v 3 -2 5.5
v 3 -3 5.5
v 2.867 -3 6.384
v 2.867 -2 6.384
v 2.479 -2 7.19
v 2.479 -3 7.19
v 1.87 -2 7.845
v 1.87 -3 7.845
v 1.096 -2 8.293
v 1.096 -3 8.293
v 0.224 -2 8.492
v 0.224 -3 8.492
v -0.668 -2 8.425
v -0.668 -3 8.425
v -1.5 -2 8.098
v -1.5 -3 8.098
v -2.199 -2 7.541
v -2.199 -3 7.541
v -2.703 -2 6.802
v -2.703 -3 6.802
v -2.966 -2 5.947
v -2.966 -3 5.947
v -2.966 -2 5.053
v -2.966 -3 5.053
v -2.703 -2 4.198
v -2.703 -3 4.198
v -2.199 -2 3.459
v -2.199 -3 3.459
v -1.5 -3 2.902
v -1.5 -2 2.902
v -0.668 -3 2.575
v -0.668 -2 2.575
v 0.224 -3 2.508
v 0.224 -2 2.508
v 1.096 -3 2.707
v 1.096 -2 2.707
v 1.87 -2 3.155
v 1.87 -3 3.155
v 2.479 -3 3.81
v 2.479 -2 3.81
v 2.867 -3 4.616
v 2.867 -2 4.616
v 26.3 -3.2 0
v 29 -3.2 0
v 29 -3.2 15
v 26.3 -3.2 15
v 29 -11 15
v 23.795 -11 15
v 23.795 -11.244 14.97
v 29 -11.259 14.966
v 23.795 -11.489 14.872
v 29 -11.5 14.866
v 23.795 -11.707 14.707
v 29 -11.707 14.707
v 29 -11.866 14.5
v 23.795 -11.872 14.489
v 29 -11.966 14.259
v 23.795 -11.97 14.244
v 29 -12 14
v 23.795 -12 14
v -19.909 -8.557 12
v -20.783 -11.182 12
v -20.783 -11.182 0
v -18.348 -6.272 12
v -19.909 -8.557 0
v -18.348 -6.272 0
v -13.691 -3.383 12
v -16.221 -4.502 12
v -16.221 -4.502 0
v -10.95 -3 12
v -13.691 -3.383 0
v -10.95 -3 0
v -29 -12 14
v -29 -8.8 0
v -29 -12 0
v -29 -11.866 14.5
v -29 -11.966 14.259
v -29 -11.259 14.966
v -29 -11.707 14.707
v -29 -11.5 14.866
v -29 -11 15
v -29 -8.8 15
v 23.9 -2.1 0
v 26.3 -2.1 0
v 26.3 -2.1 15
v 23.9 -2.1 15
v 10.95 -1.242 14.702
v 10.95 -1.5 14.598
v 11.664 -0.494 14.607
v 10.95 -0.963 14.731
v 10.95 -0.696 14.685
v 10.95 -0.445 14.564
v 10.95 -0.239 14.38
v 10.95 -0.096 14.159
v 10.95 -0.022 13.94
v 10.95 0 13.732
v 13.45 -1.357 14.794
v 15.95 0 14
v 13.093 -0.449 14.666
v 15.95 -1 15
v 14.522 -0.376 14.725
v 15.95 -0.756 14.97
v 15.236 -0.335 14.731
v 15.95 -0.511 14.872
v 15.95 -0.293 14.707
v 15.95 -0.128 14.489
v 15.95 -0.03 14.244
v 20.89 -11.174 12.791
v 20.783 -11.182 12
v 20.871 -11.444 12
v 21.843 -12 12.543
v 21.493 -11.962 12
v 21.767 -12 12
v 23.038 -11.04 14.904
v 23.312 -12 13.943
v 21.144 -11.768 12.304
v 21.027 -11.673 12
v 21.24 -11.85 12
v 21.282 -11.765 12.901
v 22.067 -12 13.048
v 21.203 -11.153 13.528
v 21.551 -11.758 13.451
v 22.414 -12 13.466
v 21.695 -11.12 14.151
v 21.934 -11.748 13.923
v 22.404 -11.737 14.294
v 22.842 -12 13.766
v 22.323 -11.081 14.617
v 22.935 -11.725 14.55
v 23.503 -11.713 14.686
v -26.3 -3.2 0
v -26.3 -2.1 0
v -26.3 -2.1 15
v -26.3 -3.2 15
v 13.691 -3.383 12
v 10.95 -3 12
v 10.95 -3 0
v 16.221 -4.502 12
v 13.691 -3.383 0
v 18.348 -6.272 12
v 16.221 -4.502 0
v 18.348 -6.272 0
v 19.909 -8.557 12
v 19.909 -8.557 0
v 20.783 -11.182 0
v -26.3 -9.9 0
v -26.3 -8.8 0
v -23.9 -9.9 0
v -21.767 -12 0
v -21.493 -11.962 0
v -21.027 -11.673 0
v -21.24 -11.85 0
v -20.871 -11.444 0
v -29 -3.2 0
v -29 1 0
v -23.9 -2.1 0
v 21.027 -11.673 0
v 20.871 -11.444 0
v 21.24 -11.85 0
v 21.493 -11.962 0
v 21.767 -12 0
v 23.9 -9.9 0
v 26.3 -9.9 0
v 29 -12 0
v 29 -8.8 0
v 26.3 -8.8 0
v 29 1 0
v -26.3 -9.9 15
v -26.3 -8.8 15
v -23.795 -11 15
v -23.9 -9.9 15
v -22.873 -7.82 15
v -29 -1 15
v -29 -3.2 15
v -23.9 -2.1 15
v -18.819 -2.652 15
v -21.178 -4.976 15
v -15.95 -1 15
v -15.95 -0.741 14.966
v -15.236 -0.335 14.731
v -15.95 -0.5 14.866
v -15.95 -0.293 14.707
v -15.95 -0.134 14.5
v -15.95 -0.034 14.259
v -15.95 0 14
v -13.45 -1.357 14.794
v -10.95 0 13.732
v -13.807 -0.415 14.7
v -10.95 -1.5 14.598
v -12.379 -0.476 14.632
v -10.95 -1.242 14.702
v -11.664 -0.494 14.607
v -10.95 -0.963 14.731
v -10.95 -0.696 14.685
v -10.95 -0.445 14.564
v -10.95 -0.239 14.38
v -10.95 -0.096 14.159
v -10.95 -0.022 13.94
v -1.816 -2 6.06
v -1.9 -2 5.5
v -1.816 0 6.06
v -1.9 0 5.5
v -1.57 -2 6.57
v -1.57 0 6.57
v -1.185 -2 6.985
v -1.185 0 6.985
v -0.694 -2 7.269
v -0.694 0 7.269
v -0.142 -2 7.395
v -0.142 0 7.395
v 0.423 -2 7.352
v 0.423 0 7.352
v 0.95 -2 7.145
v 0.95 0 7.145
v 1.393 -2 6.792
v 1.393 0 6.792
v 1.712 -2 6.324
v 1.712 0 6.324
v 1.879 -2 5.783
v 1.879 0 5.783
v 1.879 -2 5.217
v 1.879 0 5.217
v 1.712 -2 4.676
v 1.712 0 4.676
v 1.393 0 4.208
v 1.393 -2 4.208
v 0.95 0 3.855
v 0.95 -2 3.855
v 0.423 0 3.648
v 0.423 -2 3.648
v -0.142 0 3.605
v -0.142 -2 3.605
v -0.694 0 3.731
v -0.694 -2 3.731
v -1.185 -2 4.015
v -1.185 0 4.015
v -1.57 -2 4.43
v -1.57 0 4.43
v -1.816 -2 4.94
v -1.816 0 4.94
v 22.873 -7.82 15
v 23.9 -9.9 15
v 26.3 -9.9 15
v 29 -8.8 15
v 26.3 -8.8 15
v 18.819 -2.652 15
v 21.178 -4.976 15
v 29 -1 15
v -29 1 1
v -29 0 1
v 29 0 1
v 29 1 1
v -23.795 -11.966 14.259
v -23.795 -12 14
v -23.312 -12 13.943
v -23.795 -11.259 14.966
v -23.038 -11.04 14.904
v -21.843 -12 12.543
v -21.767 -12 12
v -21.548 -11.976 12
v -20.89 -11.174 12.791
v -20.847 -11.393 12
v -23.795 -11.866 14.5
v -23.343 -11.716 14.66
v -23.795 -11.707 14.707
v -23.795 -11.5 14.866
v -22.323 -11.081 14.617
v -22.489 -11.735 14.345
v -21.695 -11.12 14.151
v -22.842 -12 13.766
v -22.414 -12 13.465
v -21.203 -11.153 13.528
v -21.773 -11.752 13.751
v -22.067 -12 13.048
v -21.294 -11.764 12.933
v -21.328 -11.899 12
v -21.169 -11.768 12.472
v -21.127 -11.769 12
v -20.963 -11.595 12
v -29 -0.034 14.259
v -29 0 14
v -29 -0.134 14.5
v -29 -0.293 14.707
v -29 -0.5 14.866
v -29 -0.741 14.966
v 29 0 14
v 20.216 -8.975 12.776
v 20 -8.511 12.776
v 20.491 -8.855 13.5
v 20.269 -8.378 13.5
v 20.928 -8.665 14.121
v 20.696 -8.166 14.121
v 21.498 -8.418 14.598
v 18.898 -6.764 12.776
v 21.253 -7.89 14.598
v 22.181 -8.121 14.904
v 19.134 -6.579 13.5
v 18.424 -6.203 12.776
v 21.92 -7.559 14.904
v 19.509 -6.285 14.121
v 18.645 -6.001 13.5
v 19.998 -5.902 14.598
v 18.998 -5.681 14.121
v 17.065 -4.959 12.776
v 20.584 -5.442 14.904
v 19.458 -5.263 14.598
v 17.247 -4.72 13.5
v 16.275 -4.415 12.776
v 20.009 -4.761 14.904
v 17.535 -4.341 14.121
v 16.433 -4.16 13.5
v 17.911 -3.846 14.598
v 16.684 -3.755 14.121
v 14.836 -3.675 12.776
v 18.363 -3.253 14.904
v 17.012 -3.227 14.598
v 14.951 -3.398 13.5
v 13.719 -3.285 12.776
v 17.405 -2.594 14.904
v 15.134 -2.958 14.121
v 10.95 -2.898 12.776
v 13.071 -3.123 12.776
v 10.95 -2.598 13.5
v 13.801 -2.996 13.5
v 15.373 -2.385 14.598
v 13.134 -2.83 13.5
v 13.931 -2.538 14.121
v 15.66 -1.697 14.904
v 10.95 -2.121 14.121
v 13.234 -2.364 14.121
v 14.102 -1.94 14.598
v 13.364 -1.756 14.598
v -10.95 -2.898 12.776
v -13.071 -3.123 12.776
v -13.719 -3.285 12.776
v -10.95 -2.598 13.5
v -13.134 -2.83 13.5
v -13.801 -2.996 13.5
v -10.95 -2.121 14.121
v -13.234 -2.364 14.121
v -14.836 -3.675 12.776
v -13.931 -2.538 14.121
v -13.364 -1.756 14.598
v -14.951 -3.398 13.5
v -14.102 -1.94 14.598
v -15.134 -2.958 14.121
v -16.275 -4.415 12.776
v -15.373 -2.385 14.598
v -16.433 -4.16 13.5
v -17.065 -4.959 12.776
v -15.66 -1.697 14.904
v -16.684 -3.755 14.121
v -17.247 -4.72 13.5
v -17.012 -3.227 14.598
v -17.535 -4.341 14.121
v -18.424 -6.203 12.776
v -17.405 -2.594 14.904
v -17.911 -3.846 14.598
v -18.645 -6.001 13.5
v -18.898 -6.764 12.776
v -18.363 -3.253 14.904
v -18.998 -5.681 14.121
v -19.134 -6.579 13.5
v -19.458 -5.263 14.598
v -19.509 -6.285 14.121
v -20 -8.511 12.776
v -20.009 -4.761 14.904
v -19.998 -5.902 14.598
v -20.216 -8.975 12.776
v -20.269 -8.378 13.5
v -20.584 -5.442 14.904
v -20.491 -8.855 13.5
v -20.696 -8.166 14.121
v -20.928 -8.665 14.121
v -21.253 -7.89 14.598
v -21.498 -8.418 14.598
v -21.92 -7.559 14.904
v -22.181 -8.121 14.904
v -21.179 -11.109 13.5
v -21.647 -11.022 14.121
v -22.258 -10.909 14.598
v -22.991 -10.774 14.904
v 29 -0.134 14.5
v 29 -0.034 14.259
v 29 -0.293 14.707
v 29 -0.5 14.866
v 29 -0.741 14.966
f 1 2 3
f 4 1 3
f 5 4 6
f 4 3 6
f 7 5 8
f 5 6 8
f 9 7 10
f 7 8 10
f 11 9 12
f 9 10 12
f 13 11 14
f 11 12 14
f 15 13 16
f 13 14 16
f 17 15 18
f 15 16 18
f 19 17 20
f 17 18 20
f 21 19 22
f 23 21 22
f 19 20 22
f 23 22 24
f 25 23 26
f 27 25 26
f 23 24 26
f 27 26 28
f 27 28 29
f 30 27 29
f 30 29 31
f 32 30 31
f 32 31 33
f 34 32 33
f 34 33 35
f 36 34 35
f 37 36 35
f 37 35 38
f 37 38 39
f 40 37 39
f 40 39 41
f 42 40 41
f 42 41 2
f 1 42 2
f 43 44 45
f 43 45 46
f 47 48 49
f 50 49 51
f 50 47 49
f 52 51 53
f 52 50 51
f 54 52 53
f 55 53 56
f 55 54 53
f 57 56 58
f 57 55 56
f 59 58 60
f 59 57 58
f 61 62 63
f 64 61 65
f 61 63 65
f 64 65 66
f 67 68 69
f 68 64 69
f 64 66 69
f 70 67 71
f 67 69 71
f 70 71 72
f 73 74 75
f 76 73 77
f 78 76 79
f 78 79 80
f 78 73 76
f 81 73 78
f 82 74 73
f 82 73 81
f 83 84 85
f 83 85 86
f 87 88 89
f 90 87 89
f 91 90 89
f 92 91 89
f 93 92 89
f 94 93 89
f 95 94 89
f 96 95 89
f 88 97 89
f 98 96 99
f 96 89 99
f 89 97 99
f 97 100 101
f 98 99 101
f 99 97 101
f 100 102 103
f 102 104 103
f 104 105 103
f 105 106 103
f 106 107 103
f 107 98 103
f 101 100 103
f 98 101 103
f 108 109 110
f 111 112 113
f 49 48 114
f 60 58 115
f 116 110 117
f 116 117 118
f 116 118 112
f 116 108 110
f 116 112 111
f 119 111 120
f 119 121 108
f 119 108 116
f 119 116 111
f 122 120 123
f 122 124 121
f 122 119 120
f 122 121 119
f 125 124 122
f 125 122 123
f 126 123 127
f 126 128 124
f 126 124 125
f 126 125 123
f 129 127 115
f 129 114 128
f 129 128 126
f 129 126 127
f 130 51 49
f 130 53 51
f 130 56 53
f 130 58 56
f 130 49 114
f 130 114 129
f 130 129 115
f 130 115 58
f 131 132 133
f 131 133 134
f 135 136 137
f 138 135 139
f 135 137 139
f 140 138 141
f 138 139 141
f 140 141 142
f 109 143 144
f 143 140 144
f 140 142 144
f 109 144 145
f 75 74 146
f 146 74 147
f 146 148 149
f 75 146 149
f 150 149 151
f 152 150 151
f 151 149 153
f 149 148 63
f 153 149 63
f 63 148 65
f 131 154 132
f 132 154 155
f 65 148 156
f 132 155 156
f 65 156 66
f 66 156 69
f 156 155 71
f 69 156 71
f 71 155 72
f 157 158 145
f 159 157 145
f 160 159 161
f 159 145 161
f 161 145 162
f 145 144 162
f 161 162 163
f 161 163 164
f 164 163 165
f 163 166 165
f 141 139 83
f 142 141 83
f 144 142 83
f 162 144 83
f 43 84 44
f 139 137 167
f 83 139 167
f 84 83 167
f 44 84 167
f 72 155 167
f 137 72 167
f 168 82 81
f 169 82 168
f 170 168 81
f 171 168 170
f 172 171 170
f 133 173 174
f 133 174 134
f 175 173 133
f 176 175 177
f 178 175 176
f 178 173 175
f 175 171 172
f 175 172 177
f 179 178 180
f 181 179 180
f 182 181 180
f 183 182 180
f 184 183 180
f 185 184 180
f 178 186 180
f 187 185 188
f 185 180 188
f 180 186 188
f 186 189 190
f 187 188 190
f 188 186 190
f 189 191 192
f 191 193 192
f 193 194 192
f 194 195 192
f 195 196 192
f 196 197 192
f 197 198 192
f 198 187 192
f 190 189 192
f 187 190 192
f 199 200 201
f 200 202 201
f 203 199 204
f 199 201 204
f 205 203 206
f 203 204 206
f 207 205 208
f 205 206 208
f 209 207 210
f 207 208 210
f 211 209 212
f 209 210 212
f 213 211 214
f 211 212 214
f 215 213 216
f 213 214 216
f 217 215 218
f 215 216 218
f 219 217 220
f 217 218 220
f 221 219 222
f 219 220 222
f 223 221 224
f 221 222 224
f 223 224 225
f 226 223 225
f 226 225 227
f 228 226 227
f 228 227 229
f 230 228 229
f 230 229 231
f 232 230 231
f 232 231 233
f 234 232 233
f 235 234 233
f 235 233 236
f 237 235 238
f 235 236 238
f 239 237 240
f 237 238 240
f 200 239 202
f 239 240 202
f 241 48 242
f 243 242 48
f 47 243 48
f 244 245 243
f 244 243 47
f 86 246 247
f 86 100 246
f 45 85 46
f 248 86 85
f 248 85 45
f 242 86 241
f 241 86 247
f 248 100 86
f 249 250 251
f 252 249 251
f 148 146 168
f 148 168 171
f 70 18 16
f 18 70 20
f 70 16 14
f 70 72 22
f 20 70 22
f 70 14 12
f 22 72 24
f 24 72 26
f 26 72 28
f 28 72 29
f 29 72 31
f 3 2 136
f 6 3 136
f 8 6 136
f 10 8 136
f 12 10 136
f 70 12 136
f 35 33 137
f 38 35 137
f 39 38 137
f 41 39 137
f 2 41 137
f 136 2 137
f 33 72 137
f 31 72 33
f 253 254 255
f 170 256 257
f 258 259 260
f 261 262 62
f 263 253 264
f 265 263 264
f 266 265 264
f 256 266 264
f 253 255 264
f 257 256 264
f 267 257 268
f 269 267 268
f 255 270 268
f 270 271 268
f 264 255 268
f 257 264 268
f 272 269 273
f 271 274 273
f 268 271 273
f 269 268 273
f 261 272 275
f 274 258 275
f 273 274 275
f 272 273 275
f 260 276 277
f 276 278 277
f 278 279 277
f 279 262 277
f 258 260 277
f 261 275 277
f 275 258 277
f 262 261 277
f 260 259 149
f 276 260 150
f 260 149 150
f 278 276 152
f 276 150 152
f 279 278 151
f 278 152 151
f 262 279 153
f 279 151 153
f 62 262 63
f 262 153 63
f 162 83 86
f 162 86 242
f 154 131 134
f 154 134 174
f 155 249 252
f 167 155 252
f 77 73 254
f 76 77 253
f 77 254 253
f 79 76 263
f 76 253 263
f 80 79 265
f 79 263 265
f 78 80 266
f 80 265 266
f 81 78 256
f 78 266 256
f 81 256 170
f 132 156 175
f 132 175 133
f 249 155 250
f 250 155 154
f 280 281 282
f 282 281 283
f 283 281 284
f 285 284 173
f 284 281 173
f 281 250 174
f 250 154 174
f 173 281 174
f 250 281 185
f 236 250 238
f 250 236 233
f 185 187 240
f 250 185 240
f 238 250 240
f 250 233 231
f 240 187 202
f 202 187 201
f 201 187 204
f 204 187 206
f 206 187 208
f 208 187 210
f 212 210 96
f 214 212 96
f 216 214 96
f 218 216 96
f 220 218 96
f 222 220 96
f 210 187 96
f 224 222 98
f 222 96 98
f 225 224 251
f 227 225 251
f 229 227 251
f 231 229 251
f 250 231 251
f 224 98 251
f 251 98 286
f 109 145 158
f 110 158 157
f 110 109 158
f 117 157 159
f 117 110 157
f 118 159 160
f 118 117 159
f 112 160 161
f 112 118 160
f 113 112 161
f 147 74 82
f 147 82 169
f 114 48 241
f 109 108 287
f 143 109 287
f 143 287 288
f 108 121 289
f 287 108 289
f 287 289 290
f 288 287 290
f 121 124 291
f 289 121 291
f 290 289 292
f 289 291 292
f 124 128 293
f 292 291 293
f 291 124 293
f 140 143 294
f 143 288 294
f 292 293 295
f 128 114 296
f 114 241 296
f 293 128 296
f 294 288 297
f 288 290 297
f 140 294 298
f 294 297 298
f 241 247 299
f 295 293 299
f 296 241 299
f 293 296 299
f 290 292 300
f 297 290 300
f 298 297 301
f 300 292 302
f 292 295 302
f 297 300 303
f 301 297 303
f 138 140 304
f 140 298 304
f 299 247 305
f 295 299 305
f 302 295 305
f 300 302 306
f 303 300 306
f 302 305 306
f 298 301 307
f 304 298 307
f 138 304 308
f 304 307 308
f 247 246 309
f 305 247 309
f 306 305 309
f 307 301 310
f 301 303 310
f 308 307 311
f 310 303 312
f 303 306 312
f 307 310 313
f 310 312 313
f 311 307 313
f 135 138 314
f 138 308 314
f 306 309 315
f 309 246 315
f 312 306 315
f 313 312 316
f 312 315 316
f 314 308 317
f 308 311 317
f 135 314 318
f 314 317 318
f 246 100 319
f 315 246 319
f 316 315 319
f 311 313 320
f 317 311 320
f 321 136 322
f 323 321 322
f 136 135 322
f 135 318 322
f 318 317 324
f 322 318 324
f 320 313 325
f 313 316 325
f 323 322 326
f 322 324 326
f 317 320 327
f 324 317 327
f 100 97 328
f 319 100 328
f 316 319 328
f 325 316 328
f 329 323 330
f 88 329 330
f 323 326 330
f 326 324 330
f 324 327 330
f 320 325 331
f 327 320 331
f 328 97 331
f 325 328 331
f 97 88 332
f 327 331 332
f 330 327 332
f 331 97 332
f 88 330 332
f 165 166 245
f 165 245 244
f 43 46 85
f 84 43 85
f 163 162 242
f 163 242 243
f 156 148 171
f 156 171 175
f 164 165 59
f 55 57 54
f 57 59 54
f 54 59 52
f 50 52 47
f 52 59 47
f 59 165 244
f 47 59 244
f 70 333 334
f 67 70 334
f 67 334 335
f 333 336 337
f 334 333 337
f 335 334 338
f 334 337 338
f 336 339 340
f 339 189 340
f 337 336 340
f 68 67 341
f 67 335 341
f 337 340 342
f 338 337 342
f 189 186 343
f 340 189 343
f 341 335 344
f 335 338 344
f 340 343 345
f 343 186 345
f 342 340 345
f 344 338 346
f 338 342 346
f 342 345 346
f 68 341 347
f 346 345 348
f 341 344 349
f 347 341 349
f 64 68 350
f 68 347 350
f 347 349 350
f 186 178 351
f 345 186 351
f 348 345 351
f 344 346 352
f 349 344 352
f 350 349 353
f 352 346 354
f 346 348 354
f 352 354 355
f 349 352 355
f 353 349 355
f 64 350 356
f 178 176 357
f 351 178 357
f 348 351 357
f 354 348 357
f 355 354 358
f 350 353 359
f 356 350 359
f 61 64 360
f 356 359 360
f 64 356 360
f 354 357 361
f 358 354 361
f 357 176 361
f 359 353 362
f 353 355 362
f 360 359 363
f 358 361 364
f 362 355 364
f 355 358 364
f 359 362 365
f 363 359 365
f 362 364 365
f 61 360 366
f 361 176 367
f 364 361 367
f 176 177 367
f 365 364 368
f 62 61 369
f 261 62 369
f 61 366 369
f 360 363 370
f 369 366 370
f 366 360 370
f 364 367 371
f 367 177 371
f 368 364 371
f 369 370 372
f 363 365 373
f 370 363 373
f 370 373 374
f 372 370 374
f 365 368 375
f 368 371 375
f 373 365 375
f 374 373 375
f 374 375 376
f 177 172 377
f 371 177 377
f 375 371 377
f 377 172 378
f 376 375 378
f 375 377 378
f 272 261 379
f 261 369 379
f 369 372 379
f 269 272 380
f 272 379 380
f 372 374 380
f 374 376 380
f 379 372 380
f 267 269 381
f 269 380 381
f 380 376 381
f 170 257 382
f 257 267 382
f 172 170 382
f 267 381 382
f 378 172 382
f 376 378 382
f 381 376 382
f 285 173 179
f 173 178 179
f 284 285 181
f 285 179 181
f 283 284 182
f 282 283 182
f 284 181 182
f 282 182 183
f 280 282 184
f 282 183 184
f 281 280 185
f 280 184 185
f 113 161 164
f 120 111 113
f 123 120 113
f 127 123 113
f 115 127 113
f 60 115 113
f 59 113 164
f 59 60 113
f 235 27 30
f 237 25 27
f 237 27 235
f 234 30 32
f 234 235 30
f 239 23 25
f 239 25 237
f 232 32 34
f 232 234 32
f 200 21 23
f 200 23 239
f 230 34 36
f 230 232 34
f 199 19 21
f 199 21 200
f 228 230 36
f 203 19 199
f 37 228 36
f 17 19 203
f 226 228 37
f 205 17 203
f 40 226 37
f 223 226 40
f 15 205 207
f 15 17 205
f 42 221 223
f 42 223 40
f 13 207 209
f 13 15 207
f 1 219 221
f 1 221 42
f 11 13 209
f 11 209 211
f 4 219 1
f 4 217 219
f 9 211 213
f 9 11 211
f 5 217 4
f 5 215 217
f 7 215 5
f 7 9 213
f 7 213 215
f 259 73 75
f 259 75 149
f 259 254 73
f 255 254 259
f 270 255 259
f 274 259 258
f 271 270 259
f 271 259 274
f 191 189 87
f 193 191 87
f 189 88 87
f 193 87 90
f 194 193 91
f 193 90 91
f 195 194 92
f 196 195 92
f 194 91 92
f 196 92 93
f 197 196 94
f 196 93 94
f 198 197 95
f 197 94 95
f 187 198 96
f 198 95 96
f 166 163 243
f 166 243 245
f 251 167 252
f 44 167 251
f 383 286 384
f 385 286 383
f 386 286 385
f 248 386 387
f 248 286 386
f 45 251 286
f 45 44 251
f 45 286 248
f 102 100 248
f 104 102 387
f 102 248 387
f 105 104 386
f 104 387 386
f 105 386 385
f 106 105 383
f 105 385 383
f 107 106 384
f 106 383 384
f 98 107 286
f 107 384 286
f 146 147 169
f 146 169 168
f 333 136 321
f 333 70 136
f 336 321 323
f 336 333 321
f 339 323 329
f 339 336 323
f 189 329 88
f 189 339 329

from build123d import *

# Parameters (mm, degrees)
F0_W           = 58
F0_H           = 15
F2_DEPTH       = 12
F4_DEPTH       = 25
F5_W           = 41.8
F5_H           = 9
F6_DEPTH       = 25
F1_W           = 58
F1_H           = 1
F8_DEPTH       = 1
F9_D           = 3.8
F9_CBORE_D     = 6
F9_CBORE_DEPTH = 1
F10_T1_DEPTH   = 15
F11_R          = 2.99999
F12_R          = 1
F13_R          = 1


# Not quite as in the source:
# - a fillet or chamfer that OpenCascade refuses, or shapes differently, is made with other operations: its cross-section is extruded or revolved along the edge and cut away or added
# - a fillet or chamfer is up to 0.001 mm smaller than in the source, because OpenCascade refuses the exact size


with BuildPart() as f2:
    # F0 (on Front) → F2 (new body)
    with BuildSketch(Plane.XZ):
        with Locations((0, 7.5)):
            Rectangle(F0_W, F0_H)
    extrude(amount=F2_DEPTH)

    # F3 (on Top) → F4 (cut)
    with BuildSketch(Plane.XY):
        Polygon((-26.3, -3.2), (-29, -3.2), (-29, -8.8), (-26.3, -8.8), (-26.3, -9.9), (-23.9, -9.9), (-23.9, -2.1), (-26.3, -2.1), align=None)
        Polygon((29, -8.8), (29, -3.2), (26.3, -3.2), (26.3, -2.1), (23.9, -2.1), (23.9, -9.9), (26.3, -9.9), (26.3, -8.8), align=None)
    extrude(amount=F4_DEPTH, mode=Mode.SUBTRACT)

    # F5 (on Top) → F6 (cut)
    with BuildSketch(Plane.XY):
        with Locations((0, -7.5)):
            Rectangle(F5_W, F5_H)
    extrude(amount=F6_DEPTH, mode=Mode.SUBTRACT)

    # F1 (on Front) → F8 (join)
    with BuildSketch(Plane.XZ):
        with Locations((0, 0.5)):
            Rectangle(F1_W, F1_H)
    extrude(amount=-F8_DEPTH)

    # F9 (through all)
    with Locations(Plane.XZ.offset(3)):
        with Locations((0, 5.5)):
            CounterBoreHole(F9_D / 2, F9_CBORE_D / 2, F9_CBORE_DEPTH)

    # F10: fillet of radius 10 on 2 edges, made by hand

    # F10_s2 → F10_t1 (join)
    with BuildSketch(Plane.XY):
        with BuildLine():
            ThreePointArc((-20.9, -12), (-17.6583295614, -5.5838015129), (-10.9501256289, -3))
            Line((-10.9501256289, -3), (-20.9, -3))
            Line((-20.9, -3), (-20.9, -12))
        make_face()
        with BuildLine():
            ThreePointArc((10.9501256289, -3), (17.6583295614, -5.5838015129), (20.9, -12))
            Line((20.9, -12), (20.9, -3))
            Line((20.9, -3), (10.9501256289, -3))
        make_face()
    extrude(amount=F10_T1_DEPTH)

    # F11 (radius 3 in the source; OpenCascade refuses exactly that, so slightly less here)
    f11_edges = [f2.edges().sort_by_distance(p)[0] for p in [
        (0, -3, 15),
        (17.65833, -5.583802, 15),
        (-17.65833, -5.583802, 15),
    ]]
    fillet(f11_edges, radius=F11_R)

    # F12
    f12_edges = [f2.edges().sort_by_distance(p)[0] for p in [
        (-26.455798, -12, 15),
        (26.455798, -12, 15),
    ]]
    fillet(f12_edges, radius=F12_R)

    # F13
    f13_edges = [f2.edges().sort_by_distance(p)[0] for p in [
        (0, 0, 15),
    ]]
    fillet(f13_edges, radius=F13_R)


solid = f2.part
